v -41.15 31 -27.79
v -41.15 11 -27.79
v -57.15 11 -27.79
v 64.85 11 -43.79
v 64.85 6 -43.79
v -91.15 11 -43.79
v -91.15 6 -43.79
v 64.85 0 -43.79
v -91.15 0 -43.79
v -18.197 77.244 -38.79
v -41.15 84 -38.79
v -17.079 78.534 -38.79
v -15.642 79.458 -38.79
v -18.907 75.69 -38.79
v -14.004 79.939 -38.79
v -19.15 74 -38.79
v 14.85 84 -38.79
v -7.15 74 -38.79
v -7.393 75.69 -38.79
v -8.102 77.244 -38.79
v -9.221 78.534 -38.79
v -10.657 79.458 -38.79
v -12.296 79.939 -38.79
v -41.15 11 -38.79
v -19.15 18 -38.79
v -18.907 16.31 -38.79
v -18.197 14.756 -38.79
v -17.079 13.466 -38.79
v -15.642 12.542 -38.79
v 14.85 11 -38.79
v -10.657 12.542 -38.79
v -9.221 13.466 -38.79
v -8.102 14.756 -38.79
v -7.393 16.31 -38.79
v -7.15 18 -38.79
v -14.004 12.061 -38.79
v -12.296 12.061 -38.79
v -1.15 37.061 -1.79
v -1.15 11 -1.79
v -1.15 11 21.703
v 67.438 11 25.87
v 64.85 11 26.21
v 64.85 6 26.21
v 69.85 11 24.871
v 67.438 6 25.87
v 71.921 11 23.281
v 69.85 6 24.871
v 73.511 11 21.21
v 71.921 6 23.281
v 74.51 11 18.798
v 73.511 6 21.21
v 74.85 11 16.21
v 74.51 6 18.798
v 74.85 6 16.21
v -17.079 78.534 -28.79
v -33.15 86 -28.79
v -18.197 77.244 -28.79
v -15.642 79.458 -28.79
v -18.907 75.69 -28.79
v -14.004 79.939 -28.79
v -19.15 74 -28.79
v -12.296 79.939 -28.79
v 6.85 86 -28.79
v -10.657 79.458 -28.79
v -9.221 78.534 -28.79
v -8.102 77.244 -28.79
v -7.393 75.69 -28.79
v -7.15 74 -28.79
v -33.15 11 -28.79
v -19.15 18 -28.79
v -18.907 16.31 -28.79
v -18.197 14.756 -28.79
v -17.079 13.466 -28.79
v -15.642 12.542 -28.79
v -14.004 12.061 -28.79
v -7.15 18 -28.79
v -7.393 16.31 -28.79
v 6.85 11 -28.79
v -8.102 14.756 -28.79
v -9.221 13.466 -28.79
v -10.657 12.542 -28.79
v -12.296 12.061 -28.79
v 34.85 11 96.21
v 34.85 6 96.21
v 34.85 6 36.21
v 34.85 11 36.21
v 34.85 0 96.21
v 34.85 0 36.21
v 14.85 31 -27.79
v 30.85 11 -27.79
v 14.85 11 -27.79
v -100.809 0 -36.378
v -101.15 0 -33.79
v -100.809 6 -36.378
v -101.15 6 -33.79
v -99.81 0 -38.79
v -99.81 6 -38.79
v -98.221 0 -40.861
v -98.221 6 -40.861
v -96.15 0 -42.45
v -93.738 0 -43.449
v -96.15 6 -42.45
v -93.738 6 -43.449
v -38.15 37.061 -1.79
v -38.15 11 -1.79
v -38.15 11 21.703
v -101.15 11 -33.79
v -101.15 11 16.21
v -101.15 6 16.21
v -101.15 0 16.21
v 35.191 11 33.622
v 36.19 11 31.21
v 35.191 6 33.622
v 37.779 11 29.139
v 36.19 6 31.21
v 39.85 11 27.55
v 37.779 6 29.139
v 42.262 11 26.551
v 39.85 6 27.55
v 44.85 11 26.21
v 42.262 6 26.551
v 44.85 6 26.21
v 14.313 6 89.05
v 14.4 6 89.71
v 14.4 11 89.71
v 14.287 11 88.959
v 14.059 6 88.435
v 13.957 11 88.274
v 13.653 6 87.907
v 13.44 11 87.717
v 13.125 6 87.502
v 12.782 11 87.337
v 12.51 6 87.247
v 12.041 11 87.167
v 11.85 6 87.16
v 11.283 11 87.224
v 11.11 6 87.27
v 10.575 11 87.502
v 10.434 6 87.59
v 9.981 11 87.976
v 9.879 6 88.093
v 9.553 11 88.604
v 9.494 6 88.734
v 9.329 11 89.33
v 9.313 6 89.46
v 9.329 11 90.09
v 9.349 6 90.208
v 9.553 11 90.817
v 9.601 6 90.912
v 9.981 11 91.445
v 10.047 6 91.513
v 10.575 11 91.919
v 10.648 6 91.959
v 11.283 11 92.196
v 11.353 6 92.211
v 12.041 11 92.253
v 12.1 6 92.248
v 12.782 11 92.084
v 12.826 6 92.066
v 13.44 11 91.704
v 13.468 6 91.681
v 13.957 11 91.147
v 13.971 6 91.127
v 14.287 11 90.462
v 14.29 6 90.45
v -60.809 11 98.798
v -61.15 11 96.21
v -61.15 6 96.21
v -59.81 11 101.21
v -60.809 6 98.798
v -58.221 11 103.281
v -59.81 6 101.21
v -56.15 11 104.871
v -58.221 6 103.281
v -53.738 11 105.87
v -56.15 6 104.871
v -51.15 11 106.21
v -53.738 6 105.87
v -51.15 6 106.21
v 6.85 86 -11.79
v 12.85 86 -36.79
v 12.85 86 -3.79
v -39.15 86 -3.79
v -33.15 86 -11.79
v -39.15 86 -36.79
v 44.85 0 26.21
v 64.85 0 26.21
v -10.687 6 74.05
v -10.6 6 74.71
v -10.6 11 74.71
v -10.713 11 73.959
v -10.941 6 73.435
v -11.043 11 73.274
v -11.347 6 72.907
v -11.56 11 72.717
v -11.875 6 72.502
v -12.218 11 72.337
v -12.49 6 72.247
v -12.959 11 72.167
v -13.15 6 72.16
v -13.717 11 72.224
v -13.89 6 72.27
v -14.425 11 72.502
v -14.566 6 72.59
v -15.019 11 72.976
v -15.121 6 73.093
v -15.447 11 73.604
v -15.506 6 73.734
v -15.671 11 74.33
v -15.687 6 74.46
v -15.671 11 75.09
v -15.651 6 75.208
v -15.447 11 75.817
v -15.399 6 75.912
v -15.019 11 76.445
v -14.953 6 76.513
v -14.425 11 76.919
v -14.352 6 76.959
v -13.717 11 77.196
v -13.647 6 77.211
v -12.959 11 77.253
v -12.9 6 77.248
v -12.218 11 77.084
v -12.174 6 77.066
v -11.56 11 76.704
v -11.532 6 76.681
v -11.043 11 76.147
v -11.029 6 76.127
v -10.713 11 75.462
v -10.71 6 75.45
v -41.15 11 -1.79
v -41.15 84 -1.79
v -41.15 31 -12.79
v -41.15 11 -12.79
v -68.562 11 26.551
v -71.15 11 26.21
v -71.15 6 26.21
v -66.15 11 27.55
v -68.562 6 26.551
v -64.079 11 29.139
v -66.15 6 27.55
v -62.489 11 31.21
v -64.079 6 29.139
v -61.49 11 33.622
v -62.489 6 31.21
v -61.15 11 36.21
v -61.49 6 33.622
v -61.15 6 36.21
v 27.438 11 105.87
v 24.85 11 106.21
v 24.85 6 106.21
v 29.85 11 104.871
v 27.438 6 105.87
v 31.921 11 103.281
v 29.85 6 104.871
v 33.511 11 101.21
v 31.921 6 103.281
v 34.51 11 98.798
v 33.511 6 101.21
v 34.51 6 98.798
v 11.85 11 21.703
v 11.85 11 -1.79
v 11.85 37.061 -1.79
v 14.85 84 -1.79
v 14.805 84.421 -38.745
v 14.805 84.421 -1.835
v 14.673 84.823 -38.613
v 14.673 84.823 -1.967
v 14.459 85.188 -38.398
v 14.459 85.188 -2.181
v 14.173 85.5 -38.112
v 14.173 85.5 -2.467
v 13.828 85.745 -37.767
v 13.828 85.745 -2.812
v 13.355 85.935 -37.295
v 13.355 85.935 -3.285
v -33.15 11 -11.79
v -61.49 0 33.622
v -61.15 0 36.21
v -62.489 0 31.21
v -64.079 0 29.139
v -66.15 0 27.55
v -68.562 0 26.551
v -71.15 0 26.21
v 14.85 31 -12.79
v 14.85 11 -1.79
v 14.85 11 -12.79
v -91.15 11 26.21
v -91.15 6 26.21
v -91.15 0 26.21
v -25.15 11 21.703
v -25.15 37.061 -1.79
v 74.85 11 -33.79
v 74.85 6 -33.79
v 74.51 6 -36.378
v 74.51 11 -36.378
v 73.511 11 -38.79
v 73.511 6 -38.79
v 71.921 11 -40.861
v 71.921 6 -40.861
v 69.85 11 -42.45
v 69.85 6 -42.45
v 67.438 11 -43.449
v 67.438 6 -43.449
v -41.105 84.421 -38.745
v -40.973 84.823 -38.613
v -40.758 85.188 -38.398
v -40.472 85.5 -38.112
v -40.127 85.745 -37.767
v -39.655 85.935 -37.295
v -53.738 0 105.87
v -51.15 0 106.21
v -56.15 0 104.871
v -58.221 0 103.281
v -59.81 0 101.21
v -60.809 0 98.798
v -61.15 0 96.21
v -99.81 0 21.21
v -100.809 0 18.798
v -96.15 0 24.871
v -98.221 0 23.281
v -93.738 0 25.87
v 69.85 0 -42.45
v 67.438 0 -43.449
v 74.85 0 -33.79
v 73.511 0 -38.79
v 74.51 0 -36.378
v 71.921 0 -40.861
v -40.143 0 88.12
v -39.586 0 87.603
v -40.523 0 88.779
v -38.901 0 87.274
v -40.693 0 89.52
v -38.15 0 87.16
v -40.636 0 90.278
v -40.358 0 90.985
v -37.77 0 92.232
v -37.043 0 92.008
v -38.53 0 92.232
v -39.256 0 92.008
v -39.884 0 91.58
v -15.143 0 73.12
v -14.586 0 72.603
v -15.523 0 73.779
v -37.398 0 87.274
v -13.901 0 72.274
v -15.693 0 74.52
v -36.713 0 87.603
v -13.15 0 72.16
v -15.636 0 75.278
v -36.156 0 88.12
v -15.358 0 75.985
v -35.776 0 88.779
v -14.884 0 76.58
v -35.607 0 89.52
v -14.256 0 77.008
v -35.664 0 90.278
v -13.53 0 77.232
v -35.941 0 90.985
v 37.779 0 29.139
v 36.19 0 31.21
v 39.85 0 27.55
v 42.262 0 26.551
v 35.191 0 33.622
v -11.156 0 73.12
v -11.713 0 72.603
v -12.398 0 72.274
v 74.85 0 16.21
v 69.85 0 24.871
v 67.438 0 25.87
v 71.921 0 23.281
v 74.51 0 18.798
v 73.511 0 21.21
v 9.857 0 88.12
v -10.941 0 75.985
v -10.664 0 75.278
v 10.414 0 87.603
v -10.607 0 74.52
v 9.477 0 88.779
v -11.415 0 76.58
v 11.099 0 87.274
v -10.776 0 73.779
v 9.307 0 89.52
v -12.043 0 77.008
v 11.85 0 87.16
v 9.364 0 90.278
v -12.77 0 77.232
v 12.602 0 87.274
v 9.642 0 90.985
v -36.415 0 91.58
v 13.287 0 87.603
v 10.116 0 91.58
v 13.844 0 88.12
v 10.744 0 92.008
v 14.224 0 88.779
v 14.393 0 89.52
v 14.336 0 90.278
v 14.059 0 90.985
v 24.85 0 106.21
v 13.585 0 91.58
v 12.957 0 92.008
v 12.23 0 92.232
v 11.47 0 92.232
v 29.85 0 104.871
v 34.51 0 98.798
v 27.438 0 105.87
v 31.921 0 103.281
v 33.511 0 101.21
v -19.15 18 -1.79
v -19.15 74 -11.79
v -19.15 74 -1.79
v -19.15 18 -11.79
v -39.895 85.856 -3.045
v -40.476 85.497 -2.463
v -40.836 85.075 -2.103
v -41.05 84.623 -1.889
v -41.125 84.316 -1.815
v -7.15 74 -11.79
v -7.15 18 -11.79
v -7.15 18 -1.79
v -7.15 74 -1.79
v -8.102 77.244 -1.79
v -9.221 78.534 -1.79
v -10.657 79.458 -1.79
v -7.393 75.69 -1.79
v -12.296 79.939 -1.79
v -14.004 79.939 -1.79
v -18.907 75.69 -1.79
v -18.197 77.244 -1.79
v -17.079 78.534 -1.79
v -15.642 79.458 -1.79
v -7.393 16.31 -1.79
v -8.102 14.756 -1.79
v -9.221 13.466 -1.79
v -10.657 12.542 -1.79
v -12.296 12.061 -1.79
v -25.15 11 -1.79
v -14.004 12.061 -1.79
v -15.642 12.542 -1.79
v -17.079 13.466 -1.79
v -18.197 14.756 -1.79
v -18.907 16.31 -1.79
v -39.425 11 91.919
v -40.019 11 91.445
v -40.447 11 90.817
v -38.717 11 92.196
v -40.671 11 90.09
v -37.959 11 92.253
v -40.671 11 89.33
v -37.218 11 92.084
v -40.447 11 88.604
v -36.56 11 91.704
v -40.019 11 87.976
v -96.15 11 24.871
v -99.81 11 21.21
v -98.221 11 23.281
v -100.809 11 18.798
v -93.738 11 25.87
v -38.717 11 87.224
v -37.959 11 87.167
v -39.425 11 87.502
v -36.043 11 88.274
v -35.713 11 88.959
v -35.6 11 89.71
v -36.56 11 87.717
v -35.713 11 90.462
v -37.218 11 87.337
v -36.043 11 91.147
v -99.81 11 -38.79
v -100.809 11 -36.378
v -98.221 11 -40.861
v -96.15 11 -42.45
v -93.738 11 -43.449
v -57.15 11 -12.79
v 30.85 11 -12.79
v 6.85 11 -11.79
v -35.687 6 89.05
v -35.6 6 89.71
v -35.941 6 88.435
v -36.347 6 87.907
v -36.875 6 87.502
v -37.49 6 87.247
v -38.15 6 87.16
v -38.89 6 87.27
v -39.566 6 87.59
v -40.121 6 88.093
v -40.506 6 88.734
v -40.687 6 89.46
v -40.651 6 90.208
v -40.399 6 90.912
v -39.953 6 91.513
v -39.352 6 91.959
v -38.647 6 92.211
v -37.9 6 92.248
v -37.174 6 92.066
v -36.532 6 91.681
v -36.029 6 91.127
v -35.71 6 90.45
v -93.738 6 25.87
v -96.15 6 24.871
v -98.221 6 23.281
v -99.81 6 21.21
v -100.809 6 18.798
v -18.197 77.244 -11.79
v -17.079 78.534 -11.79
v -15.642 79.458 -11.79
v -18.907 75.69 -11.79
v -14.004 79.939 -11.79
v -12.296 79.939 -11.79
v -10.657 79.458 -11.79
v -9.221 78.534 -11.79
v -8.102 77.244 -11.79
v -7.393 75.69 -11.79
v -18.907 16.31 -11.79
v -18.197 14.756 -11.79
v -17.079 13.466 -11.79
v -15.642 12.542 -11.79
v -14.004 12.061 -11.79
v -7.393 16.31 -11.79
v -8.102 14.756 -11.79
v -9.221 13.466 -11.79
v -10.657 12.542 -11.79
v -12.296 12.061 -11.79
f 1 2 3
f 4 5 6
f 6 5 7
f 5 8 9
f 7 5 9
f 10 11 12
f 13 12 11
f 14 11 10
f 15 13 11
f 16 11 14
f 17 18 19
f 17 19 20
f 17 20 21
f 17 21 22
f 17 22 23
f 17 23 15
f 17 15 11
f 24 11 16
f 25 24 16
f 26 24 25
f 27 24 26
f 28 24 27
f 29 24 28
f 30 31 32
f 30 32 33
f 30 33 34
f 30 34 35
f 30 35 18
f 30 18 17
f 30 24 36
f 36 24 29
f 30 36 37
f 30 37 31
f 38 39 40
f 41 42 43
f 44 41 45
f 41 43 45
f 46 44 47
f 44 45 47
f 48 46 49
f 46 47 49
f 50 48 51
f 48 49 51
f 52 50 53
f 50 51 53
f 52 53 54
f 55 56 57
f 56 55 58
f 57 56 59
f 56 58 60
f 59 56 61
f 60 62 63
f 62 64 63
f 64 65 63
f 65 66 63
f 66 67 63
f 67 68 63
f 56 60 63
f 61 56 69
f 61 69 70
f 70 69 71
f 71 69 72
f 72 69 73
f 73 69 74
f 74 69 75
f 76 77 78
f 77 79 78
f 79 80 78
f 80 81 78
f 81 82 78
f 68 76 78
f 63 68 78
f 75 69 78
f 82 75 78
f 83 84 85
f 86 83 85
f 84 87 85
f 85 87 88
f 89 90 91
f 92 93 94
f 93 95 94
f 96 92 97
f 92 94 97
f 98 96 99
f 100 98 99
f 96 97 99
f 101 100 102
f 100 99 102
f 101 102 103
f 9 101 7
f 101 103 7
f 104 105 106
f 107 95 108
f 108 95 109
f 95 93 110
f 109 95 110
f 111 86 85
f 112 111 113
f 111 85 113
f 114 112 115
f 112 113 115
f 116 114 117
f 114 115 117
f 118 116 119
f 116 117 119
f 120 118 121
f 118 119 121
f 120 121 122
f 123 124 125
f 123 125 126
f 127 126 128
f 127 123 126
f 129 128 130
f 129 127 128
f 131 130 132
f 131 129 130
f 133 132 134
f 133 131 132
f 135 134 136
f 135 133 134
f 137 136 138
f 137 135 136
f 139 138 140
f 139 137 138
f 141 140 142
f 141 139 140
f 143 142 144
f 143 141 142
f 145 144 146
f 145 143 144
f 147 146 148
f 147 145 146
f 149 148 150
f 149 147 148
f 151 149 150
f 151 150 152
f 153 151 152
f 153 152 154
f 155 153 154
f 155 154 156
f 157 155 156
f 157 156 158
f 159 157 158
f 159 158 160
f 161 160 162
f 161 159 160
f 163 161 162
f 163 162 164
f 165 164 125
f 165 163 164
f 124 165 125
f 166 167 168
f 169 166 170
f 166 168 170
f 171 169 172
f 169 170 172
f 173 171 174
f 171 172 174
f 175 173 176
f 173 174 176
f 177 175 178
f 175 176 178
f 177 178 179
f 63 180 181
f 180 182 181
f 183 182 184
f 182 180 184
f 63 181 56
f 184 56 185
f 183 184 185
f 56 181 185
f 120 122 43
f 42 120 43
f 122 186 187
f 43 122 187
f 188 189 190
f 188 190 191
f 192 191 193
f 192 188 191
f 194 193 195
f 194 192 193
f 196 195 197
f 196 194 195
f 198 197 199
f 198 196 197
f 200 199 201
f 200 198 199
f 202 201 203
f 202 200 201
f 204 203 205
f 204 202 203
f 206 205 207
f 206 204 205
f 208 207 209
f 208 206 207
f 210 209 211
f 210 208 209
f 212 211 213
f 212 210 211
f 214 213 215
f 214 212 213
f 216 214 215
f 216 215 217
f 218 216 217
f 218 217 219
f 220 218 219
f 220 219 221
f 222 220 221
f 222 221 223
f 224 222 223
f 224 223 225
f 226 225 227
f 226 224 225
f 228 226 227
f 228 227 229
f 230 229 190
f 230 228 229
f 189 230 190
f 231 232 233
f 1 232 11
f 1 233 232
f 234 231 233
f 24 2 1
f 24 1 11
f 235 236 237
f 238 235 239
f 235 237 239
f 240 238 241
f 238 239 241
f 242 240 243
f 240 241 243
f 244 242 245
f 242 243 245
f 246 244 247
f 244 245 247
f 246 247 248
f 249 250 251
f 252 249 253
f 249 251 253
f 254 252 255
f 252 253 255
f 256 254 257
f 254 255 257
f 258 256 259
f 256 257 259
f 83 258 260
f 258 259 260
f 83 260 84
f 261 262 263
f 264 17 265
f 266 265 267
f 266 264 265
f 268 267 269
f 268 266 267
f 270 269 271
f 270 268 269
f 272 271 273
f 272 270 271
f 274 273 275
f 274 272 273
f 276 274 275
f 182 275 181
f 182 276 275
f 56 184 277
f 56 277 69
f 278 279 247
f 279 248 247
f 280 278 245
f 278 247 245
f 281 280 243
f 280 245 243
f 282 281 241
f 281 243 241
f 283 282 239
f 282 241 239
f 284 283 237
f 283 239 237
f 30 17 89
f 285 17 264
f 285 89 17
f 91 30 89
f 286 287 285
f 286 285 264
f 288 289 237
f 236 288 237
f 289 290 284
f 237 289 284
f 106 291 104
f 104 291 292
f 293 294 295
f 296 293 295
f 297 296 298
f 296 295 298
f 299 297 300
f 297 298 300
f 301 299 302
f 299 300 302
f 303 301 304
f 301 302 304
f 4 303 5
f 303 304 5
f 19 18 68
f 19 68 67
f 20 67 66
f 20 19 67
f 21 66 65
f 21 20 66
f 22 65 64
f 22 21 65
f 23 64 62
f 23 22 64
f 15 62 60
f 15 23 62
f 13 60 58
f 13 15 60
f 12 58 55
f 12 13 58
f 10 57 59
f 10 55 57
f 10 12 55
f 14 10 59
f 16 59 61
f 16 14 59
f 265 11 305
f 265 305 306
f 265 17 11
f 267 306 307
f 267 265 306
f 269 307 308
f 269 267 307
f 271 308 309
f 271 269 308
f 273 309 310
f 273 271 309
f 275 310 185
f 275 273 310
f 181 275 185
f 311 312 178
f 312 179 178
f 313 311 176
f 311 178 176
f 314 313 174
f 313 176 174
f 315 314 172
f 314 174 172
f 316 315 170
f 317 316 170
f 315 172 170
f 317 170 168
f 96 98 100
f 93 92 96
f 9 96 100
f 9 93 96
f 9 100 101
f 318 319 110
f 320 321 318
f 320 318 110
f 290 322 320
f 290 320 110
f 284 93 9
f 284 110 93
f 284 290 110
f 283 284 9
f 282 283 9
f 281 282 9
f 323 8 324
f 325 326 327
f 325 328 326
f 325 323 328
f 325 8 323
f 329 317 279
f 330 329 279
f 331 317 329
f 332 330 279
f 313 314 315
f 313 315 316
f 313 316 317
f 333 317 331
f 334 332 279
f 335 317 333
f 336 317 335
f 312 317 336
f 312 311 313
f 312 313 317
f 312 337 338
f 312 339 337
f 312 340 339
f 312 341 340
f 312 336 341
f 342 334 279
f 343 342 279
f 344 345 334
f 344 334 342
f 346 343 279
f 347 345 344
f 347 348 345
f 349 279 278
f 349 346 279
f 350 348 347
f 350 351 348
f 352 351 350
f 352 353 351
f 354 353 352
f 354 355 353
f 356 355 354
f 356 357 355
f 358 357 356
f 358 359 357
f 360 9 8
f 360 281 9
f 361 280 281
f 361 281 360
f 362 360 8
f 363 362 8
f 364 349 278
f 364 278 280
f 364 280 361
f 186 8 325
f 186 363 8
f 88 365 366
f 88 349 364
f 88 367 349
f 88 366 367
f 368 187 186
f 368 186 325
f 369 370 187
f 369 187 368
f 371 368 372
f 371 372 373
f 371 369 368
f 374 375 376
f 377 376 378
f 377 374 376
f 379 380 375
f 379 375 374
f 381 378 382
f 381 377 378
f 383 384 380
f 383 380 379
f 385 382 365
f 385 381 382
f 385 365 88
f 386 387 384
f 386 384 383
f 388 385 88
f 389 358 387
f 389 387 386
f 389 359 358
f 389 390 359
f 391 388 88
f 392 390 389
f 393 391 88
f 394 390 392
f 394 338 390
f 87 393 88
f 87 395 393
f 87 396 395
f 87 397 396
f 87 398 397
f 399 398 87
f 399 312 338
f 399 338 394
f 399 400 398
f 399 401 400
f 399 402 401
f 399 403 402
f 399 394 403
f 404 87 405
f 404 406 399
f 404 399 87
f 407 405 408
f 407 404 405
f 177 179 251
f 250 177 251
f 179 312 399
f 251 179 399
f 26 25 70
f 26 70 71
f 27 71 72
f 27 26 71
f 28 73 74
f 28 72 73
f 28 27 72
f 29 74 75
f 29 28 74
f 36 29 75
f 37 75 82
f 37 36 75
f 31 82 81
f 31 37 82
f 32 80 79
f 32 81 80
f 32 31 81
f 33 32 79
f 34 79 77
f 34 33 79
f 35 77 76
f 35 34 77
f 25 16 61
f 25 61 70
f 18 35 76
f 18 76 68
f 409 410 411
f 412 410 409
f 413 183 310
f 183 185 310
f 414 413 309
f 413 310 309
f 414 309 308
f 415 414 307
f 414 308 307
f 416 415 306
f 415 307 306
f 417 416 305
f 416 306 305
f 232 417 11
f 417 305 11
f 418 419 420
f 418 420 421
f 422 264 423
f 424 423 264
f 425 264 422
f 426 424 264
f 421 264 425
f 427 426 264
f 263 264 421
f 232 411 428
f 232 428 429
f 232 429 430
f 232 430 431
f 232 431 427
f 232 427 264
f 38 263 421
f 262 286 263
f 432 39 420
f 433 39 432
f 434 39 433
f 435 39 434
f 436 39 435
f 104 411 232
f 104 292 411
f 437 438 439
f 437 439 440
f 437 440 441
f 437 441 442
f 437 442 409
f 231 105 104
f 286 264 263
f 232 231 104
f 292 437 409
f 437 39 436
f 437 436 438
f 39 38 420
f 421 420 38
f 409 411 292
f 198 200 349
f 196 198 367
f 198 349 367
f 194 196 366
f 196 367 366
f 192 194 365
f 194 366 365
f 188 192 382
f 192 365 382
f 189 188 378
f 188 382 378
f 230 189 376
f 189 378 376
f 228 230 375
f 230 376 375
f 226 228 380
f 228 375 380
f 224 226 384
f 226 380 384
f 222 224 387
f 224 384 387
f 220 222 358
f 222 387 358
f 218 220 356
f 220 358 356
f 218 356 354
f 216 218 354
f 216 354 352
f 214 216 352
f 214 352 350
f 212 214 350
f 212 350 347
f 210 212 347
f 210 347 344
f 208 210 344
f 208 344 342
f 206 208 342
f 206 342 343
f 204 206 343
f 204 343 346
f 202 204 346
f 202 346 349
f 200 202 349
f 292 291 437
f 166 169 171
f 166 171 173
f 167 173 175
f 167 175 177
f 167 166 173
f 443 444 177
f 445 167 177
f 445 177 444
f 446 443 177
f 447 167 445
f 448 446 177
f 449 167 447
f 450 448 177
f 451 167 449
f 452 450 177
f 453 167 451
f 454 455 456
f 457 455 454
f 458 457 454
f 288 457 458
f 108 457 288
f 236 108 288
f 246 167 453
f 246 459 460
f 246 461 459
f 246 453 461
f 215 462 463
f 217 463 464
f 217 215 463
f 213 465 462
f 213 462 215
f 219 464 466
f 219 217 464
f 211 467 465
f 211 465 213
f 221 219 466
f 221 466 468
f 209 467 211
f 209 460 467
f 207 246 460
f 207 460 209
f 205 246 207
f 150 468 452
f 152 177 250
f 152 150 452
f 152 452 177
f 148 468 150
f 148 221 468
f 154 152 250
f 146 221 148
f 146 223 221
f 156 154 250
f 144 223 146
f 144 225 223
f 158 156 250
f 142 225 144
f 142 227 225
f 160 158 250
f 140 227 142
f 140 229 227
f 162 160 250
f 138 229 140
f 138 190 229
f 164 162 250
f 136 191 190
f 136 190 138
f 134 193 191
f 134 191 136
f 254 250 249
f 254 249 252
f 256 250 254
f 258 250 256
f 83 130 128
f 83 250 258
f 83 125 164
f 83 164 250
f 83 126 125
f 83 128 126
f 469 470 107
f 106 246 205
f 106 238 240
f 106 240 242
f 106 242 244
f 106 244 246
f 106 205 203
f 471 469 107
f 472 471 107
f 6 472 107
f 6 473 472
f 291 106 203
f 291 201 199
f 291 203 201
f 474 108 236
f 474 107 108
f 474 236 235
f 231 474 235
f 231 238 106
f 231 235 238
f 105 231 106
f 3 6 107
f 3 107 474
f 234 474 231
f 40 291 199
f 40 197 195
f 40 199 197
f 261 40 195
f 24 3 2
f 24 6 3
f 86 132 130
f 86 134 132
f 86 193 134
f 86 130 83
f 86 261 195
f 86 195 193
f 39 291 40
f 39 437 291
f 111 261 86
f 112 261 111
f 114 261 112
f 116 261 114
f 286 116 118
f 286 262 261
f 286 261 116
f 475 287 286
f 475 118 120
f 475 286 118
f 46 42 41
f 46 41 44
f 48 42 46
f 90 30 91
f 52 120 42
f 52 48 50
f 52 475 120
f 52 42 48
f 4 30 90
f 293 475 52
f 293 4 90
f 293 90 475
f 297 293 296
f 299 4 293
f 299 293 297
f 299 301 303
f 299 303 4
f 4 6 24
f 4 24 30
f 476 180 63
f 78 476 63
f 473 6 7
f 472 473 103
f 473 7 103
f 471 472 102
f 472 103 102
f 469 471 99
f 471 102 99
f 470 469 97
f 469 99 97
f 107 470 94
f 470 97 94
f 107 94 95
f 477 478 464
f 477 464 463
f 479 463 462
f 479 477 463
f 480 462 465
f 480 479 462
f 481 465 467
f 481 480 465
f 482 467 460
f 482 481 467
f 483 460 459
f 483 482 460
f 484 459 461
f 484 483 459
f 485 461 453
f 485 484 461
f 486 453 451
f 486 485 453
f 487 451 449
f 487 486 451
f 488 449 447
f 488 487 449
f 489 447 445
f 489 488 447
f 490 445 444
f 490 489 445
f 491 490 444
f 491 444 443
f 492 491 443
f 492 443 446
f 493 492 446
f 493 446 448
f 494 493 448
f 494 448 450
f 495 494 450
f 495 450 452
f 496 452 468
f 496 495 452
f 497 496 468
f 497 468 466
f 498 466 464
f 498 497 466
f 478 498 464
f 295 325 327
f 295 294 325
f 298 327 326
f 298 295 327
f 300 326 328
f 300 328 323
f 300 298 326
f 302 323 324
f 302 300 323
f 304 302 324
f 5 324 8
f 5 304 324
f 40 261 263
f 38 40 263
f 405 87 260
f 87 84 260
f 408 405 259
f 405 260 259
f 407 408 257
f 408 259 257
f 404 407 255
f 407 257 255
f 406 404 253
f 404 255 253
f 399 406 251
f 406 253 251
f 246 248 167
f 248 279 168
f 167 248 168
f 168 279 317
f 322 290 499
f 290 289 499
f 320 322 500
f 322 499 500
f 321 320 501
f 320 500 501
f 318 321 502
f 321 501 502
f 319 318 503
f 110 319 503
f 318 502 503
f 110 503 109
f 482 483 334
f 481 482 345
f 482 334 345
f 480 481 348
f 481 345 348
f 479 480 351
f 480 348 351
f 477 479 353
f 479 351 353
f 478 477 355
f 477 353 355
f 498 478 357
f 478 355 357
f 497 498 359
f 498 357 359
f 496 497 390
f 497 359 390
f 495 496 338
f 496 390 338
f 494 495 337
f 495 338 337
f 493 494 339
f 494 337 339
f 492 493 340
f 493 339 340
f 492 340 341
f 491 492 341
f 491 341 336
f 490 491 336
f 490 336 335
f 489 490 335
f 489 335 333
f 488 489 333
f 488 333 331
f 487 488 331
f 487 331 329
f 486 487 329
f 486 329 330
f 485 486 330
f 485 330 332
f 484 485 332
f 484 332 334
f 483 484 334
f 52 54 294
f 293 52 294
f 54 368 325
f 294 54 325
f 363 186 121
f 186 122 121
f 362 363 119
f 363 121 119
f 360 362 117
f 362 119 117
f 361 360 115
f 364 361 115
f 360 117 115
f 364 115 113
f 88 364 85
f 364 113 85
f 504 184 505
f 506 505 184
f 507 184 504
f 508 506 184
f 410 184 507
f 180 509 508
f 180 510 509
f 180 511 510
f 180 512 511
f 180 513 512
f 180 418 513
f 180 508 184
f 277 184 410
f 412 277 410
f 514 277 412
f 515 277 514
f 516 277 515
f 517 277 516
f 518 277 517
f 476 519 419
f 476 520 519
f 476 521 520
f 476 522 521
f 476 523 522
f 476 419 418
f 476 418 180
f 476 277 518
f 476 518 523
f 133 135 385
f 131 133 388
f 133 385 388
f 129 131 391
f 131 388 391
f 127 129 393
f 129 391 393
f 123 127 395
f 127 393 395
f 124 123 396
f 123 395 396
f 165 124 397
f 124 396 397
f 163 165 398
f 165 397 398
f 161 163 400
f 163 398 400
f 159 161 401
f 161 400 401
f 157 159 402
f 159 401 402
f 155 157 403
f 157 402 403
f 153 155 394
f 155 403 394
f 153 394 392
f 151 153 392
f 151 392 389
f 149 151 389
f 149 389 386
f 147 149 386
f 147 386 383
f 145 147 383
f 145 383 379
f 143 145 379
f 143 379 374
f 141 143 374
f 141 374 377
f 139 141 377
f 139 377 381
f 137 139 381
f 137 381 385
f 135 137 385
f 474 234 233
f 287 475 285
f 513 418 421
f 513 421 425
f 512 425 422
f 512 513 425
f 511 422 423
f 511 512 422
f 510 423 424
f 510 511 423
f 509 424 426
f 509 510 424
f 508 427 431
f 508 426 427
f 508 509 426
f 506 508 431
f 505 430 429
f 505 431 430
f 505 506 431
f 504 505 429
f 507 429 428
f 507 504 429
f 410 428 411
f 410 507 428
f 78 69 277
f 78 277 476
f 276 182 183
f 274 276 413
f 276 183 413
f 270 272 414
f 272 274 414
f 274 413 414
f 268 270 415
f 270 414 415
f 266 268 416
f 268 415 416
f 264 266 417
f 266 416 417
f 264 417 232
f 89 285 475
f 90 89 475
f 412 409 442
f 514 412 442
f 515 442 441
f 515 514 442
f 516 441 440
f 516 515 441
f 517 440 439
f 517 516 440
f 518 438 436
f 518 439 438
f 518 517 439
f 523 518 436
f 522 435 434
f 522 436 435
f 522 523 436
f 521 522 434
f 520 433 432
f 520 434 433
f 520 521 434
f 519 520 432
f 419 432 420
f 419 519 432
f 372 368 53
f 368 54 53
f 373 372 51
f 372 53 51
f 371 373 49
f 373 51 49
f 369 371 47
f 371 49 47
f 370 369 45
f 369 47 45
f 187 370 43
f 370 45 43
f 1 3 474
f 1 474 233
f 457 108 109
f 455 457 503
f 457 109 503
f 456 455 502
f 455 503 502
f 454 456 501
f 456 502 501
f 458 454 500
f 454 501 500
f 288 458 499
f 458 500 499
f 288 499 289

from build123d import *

# Parameters (mm, degrees)
EXTRUDE_1_DEPTH     = 6
SKETCH_2_W          = 40
SKETCH_2_H          = 17
EXTRUDE_2_DEPTH     = 80
EXTRUDE_3_DEPTH     = 7.5
EXTRUDE_4_DEPTH     = 25
CUT_EXTRUDE_1_DEPTH = 124.93663618022231
CUT_EXTRUDE_2_DEPTH = 80
FILLET_1_R          = 2
SKETCH_11_R         = 2.549999999999998
SKETCH_11_W         = 176.00000000000006
SKETCH_11_H         = 70
EXTRUDE_5_DEPTH     = 6
FILLET_2_R          = 10
EXTRUDE_6_OUTLINE_R = 2.55
EXTRUDE_6_DEPTH     = 5


# Read off the part's stored shape, not the designer's step: 凸台-拉伸6
with BuildPart() as part:
    # 草图1 → 凸台-拉伸1 (new body)
    with BuildSketch(Plane(origin=(0, 0, 0), x_dir=(1, 0, 0), z_dir=(0, 1, 0))):
        Polygon((-61.14973252328083, 43.789730909681225), (-61.149732523280825, -26.210269090318775), (34.85026747671919, -26.210269090318782), (34.85026747671917, 43.789730909681225), align=None)
    extrude(amount=EXTRUDE_1_DEPTH)

    # 草图2 → 凸台-拉伸2 (add)
    with BuildSketch(Plane(origin=(0, 6, 0), x_dir=(1, 0, 0), z_dir=(0, 1, 0))):
        Polygon((-41.14973252328083, 38.78973090968122), (14.850267476719164, 38.78973090968122), (14.850267476719166, 1.7897309096812228), (-41.149732523280825, 1.7897309096812228), align=None)
        with Locations((-13.14973252328083, 20.289730909681225)):
            Rectangle(SKETCH_2_W, SKETCH_2_H, mode=Mode.SUBTRACT)
    extrude(amount=EXTRUDE_2_DEPTH)

    # 草图5 → 凸台-拉伸3 (add, symmetric)
    with BuildSketch(Plane.XY.offset(-20.289730909681218)):
        Polygon((-61.14973252328082, 6), (-41.149732523280825, 31), (-41.14973252328082, 6), align=None)
        Polygon((14.850267476719168, 30.999999999999996), (34.850267476719196, 6), (14.85026747671917, 6), align=None)
    extrude(amount=EXTRUDE_3_DEPTH, both=True)

    # 草图8 → 凸台-拉伸4 (add, symmetric)
    with BuildSketch(Plane(origin=(-13.149732523280829, 0, -1.23e-15), x_dir=(9e-17, 0, -1), z_dir=(1, 0, 9e-17))):
        Polygon((-26.21026909031878, 6), (1.7897309096812217, 37.0606214388455), (1.7897309096812242, 6), align=None)
    extrude(amount=EXTRUDE_4_DEPTH, both=True)

    # 草图9 → 切除-拉伸1 (cut, through all)
    with BuildSketch(Plane(origin=(0, 0, -38.78973090968122), x_dir=(-1, 0, 0), z_dir=(0, 0, -1))):
        with BuildLine():
            Line((19.149732523280832, 74.00000000000001), (19.149732523280832, 18.000000000000004))
            ThreePointArc((19.149732523280832, 18.000000000000004), (13.149732523280827, 12.000000000000002), (7.149732523280827, 18.000000000000004))
            Line((7.149732523280827, 18.000000000000004), (7.149732523280827, 74.00000000000001))
            ThreePointArc((7.149732523280827, 74.00000000000001), (13.149732523280829, 80.00000000000001), (19.149732523280832, 74.00000000000001))
        make_face()
    extrude(amount=-CUT_EXTRUDE_1_DEPTH, mode=Mode.SUBTRACT)

    # 草图10 → 切除-拉伸2 (cut)
    with BuildSketch(Plane(origin=(0, 86, 0), x_dir=(1, 0, 0), z_dir=(0, 1, 0))):
        Polygon((-25.14973252328083, 1.7897309096812328), (-1.1497325232808289, 1.7897309096812328), (-1.1497325232808246, -29.118616684918184), (-25.149732523280825, -29.118616684918184), align=None)
    extrude(amount=-CUT_EXTRUDE_2_DEPTH, mode=Mode.SUBTRACT)

    # 圆角1
    fillet_1_edges = [part.edges().sort_by_distance(p)[0] for p in [
        (14.850267476719164, 86, -20.28973090968122),
        (-13.149732523280832, 86, -38.78973090968122),
        (-41.14973252328083, 86, -20.289730909681218),
        (-13.14973252328083, 86, -1.7897309096812228),
    ]]
    fillet(fillet_1_edges, radius=FILLET_1_R)

    # 草图11 → 凸台-拉伸5 (add)
    # profile 1 of 3: a face of its own
    with BuildSketch(Plane.XZ):
        Polygon((-61.14973252328083, -43.789730909681225), (34.85026747671919, -43.789730909681225), (34.850267476719196, 106.21026909031877), (-61.14973252328083, 106.21026909031877), align=None)
        with Locations(Location((-38.14973252328083, 89.71026909031877, 0), (0, 0, 270))):
            Circle(SKETCH_11_R, mode=Mode.SUBTRACT)
        with Locations(Location((11.850267476719166, 89.71026909031877, 0), (0, 0, 270))):
            Circle(SKETCH_11_R, mode=Mode.SUBTRACT)
        with Locations(Location((-13.149732523280832, 74.71026909031877, 0), (0, 0, 270))):
            Circle(SKETCH_11_R, mode=Mode.SUBTRACT)
    # profile 2 of 3: a face of its own
    with BuildSketch(Plane.XZ):
        with Locations((-13.149732523280825, -8.789730909681222)):
            Rectangle(SKETCH_11_W, SKETCH_11_H)
    # profile 3 of 3: a face of its own
    with BuildSketch(Plane.XZ):
        Polygon((12.850267476719164, -36.78973090968122), (12.850267476719166, -3.789730909681223), (-39.14973252328082, -3.789730909681223), (-39.149732523280825, -36.78973090968122), align=None)
    extrude(amount=-EXTRUDE_5_DEPTH)

    # 圆角2
    fillet_2_edges = [part.edges().sort_by_distance(p)[0] for p in [
        (-61.149732523280825, 3, 26.21026909031878),
        (-61.14973252328083, 3, 106.21026909031877),
        (34.850267476719196, 3, 106.21026909031877),
        (34.85026747671919, 3, 26.21026909031878),
        (74.8502674767192, 3, 26.210269090318782),
        (74.8502674767192, 3, -43.789730909681225),
        (-101.14973252328083, 3, -43.789730909681225),
        (-101.14973252328083, 3, 26.210269090318782),
    ]]
    fillet(fillet_2_edges, radius=FILLET_2_R)

    # 凸台-拉伸6 outline → 凸台-拉伸6 (add)
    with BuildSketch(Plane(origin=(0, 6, 0), x_dir=(1, 0, 0), z_dir=(0, 1, 0))):
        with BuildLine():
            ThreePointArc((-61.149732523, -96.21026909), (-58.220800335, -103.281336902), (-51.149732523, -106.21026909))
            Line((-51.149732523, -106.21026909), (24.850267477, -106.21026909))
            ThreePointArc((24.850267477, -106.21026909), (31.921335289, -103.281336902), (34.850267477, -96.21026909))
            Line((34.850267477, -96.21026909), (34.850267477, -36.21026909))
            ThreePointArc((34.850267477, -36.21026909), (37.779199665, -29.139201278), (44.850267477, -26.21026909))
            Line((44.850267477, -26.21026909), (64.850267477, -26.21026909))
            ThreePointArc((64.850267477, -26.21026909), (71.921335289, -23.281336902), (74.850267477, -16.21026909))
            Line((74.850267477, -16.21026909), (74.850267477, 33.78973091))
            ThreePointArc((74.850267477, 33.78973091), (71.921335289, 40.860798722), (64.850267477, 43.78973091))
            Line((64.850267477, 43.78973091), (-91.149732523, 43.78973091))
            ThreePointArc((-91.149732523, 43.78973091), (-98.220800335, 40.860798722), (-101.149732523, 33.78973091))
            Line((-101.149732523, 33.78973091), (-101.149732523, -16.21026909))
            ThreePointArc((-101.149732523, -16.21026909), (-98.220800335, -23.281336902), (-91.149732523, -26.21026909))
            Line((-91.149732523, -26.21026909), (-71.149732523, -26.21026909))
            ThreePointArc((-71.149732523, -26.21026909), (-64.078664711, -29.139201278), (-61.149732523, -36.21026909))
            Line((-61.149732523, -36.21026909), (-61.149732523, -96.21026909))
        make_face()
        with Locations((-38.149732523, -89.71026909)):
            Circle(EXTRUDE_6_OUTLINE_R, mode=Mode.SUBTRACT)
        with Locations((11.850267477, -89.71026909)):
            Circle(EXTRUDE_6_OUTLINE_R, mode=Mode.SUBTRACT)
        with Locations((-13.149732523, -74.71026909)):
            Circle(EXTRUDE_6_OUTLINE_R, mode=Mode.SUBTRACT)
    extrude(amount=EXTRUDE_6_DEPTH)


solid = part.part
